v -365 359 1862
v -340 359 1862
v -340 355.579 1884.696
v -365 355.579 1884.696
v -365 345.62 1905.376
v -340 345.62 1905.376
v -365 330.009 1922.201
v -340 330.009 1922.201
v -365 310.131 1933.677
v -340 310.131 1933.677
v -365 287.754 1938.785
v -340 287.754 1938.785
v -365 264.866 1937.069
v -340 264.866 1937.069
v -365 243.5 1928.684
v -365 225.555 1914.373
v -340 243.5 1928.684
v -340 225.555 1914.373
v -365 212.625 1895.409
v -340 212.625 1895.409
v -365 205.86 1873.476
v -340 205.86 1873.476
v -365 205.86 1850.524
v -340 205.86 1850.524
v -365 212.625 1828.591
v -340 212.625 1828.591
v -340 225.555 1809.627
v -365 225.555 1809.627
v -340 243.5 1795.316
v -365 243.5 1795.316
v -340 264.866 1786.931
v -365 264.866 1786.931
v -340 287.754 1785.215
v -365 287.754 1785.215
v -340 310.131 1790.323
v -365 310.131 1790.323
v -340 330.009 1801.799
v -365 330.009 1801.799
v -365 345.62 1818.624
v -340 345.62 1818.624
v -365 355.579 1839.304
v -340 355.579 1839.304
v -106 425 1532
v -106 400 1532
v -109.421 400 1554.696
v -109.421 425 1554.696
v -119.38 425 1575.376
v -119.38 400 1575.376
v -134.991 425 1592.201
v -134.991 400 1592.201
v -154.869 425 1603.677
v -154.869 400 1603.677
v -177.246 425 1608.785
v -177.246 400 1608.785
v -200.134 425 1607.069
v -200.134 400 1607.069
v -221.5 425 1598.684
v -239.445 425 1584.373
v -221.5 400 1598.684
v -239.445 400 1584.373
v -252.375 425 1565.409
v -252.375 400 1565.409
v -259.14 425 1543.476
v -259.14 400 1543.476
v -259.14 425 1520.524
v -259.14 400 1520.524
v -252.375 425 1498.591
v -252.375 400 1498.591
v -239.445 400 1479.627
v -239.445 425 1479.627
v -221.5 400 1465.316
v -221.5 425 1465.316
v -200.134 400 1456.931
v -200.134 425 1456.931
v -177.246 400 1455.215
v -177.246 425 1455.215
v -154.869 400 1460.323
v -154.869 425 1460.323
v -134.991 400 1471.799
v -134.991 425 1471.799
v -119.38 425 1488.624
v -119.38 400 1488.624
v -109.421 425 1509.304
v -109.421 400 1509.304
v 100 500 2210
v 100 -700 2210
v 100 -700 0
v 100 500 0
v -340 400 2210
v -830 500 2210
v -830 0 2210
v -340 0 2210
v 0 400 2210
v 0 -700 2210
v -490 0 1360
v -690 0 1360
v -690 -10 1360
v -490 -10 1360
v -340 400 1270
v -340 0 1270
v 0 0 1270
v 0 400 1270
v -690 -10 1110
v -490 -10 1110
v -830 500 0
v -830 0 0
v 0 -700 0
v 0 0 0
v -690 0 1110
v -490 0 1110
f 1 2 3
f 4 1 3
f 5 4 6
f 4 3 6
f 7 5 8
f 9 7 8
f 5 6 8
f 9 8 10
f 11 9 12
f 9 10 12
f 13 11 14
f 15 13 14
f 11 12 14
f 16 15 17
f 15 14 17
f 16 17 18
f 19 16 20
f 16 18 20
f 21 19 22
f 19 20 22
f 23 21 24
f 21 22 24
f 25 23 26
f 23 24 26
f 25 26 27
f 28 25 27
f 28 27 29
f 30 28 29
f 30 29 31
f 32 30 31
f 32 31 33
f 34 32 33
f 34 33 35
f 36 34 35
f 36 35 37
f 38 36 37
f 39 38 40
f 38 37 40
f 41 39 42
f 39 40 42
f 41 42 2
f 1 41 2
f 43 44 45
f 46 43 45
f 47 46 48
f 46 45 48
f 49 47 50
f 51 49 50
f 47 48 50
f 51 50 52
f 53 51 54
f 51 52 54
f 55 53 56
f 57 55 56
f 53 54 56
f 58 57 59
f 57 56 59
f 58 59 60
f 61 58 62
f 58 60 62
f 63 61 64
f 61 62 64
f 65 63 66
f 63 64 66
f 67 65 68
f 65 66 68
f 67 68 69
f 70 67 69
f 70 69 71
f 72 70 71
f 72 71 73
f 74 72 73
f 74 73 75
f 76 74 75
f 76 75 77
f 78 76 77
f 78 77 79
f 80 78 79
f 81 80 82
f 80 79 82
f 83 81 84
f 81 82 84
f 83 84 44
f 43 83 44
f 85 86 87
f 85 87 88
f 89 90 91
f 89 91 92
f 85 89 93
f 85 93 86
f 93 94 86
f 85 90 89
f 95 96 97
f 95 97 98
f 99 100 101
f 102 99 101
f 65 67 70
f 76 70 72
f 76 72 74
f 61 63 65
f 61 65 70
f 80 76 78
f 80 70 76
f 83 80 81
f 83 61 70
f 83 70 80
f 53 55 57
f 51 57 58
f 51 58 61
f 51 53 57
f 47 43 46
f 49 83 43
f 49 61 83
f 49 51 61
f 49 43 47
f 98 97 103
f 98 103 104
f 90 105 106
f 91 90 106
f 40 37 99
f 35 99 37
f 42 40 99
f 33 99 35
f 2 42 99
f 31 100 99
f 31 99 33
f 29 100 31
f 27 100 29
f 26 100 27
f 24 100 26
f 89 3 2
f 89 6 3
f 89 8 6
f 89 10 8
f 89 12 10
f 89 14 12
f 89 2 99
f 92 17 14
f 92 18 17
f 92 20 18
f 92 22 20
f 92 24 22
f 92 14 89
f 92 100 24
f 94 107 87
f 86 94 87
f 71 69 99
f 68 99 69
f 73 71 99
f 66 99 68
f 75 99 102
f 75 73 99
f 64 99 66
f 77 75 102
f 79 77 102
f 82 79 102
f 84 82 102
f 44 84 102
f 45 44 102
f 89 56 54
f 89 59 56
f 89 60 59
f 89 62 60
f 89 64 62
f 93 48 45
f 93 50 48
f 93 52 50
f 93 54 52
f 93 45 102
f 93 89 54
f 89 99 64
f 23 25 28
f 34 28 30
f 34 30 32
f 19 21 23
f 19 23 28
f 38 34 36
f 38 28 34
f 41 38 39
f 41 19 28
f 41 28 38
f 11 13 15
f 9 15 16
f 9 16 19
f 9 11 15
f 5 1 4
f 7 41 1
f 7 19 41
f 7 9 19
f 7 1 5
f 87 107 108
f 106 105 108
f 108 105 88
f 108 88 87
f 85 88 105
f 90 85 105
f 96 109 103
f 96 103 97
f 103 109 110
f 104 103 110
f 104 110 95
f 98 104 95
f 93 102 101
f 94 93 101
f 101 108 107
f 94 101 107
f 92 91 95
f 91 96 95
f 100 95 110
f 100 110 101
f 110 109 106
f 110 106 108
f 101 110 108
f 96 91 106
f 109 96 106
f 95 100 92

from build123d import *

# Parameters (mm, degrees)
F1_DEPTH = 2210
F2_W     = 340
F2_H     = 940
F3_DEPTH = 400
F4_R     = 77
F5_DEPTH = 25
F6_R     = 77
F7_DEPTH = 25
F8_W     = 200
F8_H     = 250
F9_DEPTH = 10


with BuildPart() as f1:
    # F0 (on Top) → F1 (new body)
    with BuildSketch(Plane.XY):
        Polygon((-830, 0), (0, 0), (0, -700), (100, -700), (100, 500), (-830, 500), align=None)
    extrude(amount=F1_DEPTH)

    # F2 (on face) → F3 (cut)
    with BuildSketch(Plane.XZ):
        with Locations((-170, 1740)):
            Rectangle(F2_W, F2_H)
    extrude(amount=-F3_DEPTH, mode=Mode.SUBTRACT)

    # F4 (on face) → F5 (cut)
    with BuildSketch(Plane.XZ.offset(-400)):
        with Locations((-183, 1532)):
            Circle(F4_R)
    extrude(amount=-F5_DEPTH, mode=Mode.SUBTRACT)

    # F6 (on face) → F7 (cut)
    with BuildSketch(Plane.YZ.offset(-340)):
        with Locations((282, 1862)):
            Circle(F6_R)
    extrude(amount=-F7_DEPTH, mode=Mode.SUBTRACT)

    # F8 (on face) → F9 (join)
    with BuildSketch(Plane.XZ):
        with Locations((-590, 1235)):
            Rectangle(F8_W, F8_H)
    extrude(amount=F9_DEPTH)


solid = f1.part
